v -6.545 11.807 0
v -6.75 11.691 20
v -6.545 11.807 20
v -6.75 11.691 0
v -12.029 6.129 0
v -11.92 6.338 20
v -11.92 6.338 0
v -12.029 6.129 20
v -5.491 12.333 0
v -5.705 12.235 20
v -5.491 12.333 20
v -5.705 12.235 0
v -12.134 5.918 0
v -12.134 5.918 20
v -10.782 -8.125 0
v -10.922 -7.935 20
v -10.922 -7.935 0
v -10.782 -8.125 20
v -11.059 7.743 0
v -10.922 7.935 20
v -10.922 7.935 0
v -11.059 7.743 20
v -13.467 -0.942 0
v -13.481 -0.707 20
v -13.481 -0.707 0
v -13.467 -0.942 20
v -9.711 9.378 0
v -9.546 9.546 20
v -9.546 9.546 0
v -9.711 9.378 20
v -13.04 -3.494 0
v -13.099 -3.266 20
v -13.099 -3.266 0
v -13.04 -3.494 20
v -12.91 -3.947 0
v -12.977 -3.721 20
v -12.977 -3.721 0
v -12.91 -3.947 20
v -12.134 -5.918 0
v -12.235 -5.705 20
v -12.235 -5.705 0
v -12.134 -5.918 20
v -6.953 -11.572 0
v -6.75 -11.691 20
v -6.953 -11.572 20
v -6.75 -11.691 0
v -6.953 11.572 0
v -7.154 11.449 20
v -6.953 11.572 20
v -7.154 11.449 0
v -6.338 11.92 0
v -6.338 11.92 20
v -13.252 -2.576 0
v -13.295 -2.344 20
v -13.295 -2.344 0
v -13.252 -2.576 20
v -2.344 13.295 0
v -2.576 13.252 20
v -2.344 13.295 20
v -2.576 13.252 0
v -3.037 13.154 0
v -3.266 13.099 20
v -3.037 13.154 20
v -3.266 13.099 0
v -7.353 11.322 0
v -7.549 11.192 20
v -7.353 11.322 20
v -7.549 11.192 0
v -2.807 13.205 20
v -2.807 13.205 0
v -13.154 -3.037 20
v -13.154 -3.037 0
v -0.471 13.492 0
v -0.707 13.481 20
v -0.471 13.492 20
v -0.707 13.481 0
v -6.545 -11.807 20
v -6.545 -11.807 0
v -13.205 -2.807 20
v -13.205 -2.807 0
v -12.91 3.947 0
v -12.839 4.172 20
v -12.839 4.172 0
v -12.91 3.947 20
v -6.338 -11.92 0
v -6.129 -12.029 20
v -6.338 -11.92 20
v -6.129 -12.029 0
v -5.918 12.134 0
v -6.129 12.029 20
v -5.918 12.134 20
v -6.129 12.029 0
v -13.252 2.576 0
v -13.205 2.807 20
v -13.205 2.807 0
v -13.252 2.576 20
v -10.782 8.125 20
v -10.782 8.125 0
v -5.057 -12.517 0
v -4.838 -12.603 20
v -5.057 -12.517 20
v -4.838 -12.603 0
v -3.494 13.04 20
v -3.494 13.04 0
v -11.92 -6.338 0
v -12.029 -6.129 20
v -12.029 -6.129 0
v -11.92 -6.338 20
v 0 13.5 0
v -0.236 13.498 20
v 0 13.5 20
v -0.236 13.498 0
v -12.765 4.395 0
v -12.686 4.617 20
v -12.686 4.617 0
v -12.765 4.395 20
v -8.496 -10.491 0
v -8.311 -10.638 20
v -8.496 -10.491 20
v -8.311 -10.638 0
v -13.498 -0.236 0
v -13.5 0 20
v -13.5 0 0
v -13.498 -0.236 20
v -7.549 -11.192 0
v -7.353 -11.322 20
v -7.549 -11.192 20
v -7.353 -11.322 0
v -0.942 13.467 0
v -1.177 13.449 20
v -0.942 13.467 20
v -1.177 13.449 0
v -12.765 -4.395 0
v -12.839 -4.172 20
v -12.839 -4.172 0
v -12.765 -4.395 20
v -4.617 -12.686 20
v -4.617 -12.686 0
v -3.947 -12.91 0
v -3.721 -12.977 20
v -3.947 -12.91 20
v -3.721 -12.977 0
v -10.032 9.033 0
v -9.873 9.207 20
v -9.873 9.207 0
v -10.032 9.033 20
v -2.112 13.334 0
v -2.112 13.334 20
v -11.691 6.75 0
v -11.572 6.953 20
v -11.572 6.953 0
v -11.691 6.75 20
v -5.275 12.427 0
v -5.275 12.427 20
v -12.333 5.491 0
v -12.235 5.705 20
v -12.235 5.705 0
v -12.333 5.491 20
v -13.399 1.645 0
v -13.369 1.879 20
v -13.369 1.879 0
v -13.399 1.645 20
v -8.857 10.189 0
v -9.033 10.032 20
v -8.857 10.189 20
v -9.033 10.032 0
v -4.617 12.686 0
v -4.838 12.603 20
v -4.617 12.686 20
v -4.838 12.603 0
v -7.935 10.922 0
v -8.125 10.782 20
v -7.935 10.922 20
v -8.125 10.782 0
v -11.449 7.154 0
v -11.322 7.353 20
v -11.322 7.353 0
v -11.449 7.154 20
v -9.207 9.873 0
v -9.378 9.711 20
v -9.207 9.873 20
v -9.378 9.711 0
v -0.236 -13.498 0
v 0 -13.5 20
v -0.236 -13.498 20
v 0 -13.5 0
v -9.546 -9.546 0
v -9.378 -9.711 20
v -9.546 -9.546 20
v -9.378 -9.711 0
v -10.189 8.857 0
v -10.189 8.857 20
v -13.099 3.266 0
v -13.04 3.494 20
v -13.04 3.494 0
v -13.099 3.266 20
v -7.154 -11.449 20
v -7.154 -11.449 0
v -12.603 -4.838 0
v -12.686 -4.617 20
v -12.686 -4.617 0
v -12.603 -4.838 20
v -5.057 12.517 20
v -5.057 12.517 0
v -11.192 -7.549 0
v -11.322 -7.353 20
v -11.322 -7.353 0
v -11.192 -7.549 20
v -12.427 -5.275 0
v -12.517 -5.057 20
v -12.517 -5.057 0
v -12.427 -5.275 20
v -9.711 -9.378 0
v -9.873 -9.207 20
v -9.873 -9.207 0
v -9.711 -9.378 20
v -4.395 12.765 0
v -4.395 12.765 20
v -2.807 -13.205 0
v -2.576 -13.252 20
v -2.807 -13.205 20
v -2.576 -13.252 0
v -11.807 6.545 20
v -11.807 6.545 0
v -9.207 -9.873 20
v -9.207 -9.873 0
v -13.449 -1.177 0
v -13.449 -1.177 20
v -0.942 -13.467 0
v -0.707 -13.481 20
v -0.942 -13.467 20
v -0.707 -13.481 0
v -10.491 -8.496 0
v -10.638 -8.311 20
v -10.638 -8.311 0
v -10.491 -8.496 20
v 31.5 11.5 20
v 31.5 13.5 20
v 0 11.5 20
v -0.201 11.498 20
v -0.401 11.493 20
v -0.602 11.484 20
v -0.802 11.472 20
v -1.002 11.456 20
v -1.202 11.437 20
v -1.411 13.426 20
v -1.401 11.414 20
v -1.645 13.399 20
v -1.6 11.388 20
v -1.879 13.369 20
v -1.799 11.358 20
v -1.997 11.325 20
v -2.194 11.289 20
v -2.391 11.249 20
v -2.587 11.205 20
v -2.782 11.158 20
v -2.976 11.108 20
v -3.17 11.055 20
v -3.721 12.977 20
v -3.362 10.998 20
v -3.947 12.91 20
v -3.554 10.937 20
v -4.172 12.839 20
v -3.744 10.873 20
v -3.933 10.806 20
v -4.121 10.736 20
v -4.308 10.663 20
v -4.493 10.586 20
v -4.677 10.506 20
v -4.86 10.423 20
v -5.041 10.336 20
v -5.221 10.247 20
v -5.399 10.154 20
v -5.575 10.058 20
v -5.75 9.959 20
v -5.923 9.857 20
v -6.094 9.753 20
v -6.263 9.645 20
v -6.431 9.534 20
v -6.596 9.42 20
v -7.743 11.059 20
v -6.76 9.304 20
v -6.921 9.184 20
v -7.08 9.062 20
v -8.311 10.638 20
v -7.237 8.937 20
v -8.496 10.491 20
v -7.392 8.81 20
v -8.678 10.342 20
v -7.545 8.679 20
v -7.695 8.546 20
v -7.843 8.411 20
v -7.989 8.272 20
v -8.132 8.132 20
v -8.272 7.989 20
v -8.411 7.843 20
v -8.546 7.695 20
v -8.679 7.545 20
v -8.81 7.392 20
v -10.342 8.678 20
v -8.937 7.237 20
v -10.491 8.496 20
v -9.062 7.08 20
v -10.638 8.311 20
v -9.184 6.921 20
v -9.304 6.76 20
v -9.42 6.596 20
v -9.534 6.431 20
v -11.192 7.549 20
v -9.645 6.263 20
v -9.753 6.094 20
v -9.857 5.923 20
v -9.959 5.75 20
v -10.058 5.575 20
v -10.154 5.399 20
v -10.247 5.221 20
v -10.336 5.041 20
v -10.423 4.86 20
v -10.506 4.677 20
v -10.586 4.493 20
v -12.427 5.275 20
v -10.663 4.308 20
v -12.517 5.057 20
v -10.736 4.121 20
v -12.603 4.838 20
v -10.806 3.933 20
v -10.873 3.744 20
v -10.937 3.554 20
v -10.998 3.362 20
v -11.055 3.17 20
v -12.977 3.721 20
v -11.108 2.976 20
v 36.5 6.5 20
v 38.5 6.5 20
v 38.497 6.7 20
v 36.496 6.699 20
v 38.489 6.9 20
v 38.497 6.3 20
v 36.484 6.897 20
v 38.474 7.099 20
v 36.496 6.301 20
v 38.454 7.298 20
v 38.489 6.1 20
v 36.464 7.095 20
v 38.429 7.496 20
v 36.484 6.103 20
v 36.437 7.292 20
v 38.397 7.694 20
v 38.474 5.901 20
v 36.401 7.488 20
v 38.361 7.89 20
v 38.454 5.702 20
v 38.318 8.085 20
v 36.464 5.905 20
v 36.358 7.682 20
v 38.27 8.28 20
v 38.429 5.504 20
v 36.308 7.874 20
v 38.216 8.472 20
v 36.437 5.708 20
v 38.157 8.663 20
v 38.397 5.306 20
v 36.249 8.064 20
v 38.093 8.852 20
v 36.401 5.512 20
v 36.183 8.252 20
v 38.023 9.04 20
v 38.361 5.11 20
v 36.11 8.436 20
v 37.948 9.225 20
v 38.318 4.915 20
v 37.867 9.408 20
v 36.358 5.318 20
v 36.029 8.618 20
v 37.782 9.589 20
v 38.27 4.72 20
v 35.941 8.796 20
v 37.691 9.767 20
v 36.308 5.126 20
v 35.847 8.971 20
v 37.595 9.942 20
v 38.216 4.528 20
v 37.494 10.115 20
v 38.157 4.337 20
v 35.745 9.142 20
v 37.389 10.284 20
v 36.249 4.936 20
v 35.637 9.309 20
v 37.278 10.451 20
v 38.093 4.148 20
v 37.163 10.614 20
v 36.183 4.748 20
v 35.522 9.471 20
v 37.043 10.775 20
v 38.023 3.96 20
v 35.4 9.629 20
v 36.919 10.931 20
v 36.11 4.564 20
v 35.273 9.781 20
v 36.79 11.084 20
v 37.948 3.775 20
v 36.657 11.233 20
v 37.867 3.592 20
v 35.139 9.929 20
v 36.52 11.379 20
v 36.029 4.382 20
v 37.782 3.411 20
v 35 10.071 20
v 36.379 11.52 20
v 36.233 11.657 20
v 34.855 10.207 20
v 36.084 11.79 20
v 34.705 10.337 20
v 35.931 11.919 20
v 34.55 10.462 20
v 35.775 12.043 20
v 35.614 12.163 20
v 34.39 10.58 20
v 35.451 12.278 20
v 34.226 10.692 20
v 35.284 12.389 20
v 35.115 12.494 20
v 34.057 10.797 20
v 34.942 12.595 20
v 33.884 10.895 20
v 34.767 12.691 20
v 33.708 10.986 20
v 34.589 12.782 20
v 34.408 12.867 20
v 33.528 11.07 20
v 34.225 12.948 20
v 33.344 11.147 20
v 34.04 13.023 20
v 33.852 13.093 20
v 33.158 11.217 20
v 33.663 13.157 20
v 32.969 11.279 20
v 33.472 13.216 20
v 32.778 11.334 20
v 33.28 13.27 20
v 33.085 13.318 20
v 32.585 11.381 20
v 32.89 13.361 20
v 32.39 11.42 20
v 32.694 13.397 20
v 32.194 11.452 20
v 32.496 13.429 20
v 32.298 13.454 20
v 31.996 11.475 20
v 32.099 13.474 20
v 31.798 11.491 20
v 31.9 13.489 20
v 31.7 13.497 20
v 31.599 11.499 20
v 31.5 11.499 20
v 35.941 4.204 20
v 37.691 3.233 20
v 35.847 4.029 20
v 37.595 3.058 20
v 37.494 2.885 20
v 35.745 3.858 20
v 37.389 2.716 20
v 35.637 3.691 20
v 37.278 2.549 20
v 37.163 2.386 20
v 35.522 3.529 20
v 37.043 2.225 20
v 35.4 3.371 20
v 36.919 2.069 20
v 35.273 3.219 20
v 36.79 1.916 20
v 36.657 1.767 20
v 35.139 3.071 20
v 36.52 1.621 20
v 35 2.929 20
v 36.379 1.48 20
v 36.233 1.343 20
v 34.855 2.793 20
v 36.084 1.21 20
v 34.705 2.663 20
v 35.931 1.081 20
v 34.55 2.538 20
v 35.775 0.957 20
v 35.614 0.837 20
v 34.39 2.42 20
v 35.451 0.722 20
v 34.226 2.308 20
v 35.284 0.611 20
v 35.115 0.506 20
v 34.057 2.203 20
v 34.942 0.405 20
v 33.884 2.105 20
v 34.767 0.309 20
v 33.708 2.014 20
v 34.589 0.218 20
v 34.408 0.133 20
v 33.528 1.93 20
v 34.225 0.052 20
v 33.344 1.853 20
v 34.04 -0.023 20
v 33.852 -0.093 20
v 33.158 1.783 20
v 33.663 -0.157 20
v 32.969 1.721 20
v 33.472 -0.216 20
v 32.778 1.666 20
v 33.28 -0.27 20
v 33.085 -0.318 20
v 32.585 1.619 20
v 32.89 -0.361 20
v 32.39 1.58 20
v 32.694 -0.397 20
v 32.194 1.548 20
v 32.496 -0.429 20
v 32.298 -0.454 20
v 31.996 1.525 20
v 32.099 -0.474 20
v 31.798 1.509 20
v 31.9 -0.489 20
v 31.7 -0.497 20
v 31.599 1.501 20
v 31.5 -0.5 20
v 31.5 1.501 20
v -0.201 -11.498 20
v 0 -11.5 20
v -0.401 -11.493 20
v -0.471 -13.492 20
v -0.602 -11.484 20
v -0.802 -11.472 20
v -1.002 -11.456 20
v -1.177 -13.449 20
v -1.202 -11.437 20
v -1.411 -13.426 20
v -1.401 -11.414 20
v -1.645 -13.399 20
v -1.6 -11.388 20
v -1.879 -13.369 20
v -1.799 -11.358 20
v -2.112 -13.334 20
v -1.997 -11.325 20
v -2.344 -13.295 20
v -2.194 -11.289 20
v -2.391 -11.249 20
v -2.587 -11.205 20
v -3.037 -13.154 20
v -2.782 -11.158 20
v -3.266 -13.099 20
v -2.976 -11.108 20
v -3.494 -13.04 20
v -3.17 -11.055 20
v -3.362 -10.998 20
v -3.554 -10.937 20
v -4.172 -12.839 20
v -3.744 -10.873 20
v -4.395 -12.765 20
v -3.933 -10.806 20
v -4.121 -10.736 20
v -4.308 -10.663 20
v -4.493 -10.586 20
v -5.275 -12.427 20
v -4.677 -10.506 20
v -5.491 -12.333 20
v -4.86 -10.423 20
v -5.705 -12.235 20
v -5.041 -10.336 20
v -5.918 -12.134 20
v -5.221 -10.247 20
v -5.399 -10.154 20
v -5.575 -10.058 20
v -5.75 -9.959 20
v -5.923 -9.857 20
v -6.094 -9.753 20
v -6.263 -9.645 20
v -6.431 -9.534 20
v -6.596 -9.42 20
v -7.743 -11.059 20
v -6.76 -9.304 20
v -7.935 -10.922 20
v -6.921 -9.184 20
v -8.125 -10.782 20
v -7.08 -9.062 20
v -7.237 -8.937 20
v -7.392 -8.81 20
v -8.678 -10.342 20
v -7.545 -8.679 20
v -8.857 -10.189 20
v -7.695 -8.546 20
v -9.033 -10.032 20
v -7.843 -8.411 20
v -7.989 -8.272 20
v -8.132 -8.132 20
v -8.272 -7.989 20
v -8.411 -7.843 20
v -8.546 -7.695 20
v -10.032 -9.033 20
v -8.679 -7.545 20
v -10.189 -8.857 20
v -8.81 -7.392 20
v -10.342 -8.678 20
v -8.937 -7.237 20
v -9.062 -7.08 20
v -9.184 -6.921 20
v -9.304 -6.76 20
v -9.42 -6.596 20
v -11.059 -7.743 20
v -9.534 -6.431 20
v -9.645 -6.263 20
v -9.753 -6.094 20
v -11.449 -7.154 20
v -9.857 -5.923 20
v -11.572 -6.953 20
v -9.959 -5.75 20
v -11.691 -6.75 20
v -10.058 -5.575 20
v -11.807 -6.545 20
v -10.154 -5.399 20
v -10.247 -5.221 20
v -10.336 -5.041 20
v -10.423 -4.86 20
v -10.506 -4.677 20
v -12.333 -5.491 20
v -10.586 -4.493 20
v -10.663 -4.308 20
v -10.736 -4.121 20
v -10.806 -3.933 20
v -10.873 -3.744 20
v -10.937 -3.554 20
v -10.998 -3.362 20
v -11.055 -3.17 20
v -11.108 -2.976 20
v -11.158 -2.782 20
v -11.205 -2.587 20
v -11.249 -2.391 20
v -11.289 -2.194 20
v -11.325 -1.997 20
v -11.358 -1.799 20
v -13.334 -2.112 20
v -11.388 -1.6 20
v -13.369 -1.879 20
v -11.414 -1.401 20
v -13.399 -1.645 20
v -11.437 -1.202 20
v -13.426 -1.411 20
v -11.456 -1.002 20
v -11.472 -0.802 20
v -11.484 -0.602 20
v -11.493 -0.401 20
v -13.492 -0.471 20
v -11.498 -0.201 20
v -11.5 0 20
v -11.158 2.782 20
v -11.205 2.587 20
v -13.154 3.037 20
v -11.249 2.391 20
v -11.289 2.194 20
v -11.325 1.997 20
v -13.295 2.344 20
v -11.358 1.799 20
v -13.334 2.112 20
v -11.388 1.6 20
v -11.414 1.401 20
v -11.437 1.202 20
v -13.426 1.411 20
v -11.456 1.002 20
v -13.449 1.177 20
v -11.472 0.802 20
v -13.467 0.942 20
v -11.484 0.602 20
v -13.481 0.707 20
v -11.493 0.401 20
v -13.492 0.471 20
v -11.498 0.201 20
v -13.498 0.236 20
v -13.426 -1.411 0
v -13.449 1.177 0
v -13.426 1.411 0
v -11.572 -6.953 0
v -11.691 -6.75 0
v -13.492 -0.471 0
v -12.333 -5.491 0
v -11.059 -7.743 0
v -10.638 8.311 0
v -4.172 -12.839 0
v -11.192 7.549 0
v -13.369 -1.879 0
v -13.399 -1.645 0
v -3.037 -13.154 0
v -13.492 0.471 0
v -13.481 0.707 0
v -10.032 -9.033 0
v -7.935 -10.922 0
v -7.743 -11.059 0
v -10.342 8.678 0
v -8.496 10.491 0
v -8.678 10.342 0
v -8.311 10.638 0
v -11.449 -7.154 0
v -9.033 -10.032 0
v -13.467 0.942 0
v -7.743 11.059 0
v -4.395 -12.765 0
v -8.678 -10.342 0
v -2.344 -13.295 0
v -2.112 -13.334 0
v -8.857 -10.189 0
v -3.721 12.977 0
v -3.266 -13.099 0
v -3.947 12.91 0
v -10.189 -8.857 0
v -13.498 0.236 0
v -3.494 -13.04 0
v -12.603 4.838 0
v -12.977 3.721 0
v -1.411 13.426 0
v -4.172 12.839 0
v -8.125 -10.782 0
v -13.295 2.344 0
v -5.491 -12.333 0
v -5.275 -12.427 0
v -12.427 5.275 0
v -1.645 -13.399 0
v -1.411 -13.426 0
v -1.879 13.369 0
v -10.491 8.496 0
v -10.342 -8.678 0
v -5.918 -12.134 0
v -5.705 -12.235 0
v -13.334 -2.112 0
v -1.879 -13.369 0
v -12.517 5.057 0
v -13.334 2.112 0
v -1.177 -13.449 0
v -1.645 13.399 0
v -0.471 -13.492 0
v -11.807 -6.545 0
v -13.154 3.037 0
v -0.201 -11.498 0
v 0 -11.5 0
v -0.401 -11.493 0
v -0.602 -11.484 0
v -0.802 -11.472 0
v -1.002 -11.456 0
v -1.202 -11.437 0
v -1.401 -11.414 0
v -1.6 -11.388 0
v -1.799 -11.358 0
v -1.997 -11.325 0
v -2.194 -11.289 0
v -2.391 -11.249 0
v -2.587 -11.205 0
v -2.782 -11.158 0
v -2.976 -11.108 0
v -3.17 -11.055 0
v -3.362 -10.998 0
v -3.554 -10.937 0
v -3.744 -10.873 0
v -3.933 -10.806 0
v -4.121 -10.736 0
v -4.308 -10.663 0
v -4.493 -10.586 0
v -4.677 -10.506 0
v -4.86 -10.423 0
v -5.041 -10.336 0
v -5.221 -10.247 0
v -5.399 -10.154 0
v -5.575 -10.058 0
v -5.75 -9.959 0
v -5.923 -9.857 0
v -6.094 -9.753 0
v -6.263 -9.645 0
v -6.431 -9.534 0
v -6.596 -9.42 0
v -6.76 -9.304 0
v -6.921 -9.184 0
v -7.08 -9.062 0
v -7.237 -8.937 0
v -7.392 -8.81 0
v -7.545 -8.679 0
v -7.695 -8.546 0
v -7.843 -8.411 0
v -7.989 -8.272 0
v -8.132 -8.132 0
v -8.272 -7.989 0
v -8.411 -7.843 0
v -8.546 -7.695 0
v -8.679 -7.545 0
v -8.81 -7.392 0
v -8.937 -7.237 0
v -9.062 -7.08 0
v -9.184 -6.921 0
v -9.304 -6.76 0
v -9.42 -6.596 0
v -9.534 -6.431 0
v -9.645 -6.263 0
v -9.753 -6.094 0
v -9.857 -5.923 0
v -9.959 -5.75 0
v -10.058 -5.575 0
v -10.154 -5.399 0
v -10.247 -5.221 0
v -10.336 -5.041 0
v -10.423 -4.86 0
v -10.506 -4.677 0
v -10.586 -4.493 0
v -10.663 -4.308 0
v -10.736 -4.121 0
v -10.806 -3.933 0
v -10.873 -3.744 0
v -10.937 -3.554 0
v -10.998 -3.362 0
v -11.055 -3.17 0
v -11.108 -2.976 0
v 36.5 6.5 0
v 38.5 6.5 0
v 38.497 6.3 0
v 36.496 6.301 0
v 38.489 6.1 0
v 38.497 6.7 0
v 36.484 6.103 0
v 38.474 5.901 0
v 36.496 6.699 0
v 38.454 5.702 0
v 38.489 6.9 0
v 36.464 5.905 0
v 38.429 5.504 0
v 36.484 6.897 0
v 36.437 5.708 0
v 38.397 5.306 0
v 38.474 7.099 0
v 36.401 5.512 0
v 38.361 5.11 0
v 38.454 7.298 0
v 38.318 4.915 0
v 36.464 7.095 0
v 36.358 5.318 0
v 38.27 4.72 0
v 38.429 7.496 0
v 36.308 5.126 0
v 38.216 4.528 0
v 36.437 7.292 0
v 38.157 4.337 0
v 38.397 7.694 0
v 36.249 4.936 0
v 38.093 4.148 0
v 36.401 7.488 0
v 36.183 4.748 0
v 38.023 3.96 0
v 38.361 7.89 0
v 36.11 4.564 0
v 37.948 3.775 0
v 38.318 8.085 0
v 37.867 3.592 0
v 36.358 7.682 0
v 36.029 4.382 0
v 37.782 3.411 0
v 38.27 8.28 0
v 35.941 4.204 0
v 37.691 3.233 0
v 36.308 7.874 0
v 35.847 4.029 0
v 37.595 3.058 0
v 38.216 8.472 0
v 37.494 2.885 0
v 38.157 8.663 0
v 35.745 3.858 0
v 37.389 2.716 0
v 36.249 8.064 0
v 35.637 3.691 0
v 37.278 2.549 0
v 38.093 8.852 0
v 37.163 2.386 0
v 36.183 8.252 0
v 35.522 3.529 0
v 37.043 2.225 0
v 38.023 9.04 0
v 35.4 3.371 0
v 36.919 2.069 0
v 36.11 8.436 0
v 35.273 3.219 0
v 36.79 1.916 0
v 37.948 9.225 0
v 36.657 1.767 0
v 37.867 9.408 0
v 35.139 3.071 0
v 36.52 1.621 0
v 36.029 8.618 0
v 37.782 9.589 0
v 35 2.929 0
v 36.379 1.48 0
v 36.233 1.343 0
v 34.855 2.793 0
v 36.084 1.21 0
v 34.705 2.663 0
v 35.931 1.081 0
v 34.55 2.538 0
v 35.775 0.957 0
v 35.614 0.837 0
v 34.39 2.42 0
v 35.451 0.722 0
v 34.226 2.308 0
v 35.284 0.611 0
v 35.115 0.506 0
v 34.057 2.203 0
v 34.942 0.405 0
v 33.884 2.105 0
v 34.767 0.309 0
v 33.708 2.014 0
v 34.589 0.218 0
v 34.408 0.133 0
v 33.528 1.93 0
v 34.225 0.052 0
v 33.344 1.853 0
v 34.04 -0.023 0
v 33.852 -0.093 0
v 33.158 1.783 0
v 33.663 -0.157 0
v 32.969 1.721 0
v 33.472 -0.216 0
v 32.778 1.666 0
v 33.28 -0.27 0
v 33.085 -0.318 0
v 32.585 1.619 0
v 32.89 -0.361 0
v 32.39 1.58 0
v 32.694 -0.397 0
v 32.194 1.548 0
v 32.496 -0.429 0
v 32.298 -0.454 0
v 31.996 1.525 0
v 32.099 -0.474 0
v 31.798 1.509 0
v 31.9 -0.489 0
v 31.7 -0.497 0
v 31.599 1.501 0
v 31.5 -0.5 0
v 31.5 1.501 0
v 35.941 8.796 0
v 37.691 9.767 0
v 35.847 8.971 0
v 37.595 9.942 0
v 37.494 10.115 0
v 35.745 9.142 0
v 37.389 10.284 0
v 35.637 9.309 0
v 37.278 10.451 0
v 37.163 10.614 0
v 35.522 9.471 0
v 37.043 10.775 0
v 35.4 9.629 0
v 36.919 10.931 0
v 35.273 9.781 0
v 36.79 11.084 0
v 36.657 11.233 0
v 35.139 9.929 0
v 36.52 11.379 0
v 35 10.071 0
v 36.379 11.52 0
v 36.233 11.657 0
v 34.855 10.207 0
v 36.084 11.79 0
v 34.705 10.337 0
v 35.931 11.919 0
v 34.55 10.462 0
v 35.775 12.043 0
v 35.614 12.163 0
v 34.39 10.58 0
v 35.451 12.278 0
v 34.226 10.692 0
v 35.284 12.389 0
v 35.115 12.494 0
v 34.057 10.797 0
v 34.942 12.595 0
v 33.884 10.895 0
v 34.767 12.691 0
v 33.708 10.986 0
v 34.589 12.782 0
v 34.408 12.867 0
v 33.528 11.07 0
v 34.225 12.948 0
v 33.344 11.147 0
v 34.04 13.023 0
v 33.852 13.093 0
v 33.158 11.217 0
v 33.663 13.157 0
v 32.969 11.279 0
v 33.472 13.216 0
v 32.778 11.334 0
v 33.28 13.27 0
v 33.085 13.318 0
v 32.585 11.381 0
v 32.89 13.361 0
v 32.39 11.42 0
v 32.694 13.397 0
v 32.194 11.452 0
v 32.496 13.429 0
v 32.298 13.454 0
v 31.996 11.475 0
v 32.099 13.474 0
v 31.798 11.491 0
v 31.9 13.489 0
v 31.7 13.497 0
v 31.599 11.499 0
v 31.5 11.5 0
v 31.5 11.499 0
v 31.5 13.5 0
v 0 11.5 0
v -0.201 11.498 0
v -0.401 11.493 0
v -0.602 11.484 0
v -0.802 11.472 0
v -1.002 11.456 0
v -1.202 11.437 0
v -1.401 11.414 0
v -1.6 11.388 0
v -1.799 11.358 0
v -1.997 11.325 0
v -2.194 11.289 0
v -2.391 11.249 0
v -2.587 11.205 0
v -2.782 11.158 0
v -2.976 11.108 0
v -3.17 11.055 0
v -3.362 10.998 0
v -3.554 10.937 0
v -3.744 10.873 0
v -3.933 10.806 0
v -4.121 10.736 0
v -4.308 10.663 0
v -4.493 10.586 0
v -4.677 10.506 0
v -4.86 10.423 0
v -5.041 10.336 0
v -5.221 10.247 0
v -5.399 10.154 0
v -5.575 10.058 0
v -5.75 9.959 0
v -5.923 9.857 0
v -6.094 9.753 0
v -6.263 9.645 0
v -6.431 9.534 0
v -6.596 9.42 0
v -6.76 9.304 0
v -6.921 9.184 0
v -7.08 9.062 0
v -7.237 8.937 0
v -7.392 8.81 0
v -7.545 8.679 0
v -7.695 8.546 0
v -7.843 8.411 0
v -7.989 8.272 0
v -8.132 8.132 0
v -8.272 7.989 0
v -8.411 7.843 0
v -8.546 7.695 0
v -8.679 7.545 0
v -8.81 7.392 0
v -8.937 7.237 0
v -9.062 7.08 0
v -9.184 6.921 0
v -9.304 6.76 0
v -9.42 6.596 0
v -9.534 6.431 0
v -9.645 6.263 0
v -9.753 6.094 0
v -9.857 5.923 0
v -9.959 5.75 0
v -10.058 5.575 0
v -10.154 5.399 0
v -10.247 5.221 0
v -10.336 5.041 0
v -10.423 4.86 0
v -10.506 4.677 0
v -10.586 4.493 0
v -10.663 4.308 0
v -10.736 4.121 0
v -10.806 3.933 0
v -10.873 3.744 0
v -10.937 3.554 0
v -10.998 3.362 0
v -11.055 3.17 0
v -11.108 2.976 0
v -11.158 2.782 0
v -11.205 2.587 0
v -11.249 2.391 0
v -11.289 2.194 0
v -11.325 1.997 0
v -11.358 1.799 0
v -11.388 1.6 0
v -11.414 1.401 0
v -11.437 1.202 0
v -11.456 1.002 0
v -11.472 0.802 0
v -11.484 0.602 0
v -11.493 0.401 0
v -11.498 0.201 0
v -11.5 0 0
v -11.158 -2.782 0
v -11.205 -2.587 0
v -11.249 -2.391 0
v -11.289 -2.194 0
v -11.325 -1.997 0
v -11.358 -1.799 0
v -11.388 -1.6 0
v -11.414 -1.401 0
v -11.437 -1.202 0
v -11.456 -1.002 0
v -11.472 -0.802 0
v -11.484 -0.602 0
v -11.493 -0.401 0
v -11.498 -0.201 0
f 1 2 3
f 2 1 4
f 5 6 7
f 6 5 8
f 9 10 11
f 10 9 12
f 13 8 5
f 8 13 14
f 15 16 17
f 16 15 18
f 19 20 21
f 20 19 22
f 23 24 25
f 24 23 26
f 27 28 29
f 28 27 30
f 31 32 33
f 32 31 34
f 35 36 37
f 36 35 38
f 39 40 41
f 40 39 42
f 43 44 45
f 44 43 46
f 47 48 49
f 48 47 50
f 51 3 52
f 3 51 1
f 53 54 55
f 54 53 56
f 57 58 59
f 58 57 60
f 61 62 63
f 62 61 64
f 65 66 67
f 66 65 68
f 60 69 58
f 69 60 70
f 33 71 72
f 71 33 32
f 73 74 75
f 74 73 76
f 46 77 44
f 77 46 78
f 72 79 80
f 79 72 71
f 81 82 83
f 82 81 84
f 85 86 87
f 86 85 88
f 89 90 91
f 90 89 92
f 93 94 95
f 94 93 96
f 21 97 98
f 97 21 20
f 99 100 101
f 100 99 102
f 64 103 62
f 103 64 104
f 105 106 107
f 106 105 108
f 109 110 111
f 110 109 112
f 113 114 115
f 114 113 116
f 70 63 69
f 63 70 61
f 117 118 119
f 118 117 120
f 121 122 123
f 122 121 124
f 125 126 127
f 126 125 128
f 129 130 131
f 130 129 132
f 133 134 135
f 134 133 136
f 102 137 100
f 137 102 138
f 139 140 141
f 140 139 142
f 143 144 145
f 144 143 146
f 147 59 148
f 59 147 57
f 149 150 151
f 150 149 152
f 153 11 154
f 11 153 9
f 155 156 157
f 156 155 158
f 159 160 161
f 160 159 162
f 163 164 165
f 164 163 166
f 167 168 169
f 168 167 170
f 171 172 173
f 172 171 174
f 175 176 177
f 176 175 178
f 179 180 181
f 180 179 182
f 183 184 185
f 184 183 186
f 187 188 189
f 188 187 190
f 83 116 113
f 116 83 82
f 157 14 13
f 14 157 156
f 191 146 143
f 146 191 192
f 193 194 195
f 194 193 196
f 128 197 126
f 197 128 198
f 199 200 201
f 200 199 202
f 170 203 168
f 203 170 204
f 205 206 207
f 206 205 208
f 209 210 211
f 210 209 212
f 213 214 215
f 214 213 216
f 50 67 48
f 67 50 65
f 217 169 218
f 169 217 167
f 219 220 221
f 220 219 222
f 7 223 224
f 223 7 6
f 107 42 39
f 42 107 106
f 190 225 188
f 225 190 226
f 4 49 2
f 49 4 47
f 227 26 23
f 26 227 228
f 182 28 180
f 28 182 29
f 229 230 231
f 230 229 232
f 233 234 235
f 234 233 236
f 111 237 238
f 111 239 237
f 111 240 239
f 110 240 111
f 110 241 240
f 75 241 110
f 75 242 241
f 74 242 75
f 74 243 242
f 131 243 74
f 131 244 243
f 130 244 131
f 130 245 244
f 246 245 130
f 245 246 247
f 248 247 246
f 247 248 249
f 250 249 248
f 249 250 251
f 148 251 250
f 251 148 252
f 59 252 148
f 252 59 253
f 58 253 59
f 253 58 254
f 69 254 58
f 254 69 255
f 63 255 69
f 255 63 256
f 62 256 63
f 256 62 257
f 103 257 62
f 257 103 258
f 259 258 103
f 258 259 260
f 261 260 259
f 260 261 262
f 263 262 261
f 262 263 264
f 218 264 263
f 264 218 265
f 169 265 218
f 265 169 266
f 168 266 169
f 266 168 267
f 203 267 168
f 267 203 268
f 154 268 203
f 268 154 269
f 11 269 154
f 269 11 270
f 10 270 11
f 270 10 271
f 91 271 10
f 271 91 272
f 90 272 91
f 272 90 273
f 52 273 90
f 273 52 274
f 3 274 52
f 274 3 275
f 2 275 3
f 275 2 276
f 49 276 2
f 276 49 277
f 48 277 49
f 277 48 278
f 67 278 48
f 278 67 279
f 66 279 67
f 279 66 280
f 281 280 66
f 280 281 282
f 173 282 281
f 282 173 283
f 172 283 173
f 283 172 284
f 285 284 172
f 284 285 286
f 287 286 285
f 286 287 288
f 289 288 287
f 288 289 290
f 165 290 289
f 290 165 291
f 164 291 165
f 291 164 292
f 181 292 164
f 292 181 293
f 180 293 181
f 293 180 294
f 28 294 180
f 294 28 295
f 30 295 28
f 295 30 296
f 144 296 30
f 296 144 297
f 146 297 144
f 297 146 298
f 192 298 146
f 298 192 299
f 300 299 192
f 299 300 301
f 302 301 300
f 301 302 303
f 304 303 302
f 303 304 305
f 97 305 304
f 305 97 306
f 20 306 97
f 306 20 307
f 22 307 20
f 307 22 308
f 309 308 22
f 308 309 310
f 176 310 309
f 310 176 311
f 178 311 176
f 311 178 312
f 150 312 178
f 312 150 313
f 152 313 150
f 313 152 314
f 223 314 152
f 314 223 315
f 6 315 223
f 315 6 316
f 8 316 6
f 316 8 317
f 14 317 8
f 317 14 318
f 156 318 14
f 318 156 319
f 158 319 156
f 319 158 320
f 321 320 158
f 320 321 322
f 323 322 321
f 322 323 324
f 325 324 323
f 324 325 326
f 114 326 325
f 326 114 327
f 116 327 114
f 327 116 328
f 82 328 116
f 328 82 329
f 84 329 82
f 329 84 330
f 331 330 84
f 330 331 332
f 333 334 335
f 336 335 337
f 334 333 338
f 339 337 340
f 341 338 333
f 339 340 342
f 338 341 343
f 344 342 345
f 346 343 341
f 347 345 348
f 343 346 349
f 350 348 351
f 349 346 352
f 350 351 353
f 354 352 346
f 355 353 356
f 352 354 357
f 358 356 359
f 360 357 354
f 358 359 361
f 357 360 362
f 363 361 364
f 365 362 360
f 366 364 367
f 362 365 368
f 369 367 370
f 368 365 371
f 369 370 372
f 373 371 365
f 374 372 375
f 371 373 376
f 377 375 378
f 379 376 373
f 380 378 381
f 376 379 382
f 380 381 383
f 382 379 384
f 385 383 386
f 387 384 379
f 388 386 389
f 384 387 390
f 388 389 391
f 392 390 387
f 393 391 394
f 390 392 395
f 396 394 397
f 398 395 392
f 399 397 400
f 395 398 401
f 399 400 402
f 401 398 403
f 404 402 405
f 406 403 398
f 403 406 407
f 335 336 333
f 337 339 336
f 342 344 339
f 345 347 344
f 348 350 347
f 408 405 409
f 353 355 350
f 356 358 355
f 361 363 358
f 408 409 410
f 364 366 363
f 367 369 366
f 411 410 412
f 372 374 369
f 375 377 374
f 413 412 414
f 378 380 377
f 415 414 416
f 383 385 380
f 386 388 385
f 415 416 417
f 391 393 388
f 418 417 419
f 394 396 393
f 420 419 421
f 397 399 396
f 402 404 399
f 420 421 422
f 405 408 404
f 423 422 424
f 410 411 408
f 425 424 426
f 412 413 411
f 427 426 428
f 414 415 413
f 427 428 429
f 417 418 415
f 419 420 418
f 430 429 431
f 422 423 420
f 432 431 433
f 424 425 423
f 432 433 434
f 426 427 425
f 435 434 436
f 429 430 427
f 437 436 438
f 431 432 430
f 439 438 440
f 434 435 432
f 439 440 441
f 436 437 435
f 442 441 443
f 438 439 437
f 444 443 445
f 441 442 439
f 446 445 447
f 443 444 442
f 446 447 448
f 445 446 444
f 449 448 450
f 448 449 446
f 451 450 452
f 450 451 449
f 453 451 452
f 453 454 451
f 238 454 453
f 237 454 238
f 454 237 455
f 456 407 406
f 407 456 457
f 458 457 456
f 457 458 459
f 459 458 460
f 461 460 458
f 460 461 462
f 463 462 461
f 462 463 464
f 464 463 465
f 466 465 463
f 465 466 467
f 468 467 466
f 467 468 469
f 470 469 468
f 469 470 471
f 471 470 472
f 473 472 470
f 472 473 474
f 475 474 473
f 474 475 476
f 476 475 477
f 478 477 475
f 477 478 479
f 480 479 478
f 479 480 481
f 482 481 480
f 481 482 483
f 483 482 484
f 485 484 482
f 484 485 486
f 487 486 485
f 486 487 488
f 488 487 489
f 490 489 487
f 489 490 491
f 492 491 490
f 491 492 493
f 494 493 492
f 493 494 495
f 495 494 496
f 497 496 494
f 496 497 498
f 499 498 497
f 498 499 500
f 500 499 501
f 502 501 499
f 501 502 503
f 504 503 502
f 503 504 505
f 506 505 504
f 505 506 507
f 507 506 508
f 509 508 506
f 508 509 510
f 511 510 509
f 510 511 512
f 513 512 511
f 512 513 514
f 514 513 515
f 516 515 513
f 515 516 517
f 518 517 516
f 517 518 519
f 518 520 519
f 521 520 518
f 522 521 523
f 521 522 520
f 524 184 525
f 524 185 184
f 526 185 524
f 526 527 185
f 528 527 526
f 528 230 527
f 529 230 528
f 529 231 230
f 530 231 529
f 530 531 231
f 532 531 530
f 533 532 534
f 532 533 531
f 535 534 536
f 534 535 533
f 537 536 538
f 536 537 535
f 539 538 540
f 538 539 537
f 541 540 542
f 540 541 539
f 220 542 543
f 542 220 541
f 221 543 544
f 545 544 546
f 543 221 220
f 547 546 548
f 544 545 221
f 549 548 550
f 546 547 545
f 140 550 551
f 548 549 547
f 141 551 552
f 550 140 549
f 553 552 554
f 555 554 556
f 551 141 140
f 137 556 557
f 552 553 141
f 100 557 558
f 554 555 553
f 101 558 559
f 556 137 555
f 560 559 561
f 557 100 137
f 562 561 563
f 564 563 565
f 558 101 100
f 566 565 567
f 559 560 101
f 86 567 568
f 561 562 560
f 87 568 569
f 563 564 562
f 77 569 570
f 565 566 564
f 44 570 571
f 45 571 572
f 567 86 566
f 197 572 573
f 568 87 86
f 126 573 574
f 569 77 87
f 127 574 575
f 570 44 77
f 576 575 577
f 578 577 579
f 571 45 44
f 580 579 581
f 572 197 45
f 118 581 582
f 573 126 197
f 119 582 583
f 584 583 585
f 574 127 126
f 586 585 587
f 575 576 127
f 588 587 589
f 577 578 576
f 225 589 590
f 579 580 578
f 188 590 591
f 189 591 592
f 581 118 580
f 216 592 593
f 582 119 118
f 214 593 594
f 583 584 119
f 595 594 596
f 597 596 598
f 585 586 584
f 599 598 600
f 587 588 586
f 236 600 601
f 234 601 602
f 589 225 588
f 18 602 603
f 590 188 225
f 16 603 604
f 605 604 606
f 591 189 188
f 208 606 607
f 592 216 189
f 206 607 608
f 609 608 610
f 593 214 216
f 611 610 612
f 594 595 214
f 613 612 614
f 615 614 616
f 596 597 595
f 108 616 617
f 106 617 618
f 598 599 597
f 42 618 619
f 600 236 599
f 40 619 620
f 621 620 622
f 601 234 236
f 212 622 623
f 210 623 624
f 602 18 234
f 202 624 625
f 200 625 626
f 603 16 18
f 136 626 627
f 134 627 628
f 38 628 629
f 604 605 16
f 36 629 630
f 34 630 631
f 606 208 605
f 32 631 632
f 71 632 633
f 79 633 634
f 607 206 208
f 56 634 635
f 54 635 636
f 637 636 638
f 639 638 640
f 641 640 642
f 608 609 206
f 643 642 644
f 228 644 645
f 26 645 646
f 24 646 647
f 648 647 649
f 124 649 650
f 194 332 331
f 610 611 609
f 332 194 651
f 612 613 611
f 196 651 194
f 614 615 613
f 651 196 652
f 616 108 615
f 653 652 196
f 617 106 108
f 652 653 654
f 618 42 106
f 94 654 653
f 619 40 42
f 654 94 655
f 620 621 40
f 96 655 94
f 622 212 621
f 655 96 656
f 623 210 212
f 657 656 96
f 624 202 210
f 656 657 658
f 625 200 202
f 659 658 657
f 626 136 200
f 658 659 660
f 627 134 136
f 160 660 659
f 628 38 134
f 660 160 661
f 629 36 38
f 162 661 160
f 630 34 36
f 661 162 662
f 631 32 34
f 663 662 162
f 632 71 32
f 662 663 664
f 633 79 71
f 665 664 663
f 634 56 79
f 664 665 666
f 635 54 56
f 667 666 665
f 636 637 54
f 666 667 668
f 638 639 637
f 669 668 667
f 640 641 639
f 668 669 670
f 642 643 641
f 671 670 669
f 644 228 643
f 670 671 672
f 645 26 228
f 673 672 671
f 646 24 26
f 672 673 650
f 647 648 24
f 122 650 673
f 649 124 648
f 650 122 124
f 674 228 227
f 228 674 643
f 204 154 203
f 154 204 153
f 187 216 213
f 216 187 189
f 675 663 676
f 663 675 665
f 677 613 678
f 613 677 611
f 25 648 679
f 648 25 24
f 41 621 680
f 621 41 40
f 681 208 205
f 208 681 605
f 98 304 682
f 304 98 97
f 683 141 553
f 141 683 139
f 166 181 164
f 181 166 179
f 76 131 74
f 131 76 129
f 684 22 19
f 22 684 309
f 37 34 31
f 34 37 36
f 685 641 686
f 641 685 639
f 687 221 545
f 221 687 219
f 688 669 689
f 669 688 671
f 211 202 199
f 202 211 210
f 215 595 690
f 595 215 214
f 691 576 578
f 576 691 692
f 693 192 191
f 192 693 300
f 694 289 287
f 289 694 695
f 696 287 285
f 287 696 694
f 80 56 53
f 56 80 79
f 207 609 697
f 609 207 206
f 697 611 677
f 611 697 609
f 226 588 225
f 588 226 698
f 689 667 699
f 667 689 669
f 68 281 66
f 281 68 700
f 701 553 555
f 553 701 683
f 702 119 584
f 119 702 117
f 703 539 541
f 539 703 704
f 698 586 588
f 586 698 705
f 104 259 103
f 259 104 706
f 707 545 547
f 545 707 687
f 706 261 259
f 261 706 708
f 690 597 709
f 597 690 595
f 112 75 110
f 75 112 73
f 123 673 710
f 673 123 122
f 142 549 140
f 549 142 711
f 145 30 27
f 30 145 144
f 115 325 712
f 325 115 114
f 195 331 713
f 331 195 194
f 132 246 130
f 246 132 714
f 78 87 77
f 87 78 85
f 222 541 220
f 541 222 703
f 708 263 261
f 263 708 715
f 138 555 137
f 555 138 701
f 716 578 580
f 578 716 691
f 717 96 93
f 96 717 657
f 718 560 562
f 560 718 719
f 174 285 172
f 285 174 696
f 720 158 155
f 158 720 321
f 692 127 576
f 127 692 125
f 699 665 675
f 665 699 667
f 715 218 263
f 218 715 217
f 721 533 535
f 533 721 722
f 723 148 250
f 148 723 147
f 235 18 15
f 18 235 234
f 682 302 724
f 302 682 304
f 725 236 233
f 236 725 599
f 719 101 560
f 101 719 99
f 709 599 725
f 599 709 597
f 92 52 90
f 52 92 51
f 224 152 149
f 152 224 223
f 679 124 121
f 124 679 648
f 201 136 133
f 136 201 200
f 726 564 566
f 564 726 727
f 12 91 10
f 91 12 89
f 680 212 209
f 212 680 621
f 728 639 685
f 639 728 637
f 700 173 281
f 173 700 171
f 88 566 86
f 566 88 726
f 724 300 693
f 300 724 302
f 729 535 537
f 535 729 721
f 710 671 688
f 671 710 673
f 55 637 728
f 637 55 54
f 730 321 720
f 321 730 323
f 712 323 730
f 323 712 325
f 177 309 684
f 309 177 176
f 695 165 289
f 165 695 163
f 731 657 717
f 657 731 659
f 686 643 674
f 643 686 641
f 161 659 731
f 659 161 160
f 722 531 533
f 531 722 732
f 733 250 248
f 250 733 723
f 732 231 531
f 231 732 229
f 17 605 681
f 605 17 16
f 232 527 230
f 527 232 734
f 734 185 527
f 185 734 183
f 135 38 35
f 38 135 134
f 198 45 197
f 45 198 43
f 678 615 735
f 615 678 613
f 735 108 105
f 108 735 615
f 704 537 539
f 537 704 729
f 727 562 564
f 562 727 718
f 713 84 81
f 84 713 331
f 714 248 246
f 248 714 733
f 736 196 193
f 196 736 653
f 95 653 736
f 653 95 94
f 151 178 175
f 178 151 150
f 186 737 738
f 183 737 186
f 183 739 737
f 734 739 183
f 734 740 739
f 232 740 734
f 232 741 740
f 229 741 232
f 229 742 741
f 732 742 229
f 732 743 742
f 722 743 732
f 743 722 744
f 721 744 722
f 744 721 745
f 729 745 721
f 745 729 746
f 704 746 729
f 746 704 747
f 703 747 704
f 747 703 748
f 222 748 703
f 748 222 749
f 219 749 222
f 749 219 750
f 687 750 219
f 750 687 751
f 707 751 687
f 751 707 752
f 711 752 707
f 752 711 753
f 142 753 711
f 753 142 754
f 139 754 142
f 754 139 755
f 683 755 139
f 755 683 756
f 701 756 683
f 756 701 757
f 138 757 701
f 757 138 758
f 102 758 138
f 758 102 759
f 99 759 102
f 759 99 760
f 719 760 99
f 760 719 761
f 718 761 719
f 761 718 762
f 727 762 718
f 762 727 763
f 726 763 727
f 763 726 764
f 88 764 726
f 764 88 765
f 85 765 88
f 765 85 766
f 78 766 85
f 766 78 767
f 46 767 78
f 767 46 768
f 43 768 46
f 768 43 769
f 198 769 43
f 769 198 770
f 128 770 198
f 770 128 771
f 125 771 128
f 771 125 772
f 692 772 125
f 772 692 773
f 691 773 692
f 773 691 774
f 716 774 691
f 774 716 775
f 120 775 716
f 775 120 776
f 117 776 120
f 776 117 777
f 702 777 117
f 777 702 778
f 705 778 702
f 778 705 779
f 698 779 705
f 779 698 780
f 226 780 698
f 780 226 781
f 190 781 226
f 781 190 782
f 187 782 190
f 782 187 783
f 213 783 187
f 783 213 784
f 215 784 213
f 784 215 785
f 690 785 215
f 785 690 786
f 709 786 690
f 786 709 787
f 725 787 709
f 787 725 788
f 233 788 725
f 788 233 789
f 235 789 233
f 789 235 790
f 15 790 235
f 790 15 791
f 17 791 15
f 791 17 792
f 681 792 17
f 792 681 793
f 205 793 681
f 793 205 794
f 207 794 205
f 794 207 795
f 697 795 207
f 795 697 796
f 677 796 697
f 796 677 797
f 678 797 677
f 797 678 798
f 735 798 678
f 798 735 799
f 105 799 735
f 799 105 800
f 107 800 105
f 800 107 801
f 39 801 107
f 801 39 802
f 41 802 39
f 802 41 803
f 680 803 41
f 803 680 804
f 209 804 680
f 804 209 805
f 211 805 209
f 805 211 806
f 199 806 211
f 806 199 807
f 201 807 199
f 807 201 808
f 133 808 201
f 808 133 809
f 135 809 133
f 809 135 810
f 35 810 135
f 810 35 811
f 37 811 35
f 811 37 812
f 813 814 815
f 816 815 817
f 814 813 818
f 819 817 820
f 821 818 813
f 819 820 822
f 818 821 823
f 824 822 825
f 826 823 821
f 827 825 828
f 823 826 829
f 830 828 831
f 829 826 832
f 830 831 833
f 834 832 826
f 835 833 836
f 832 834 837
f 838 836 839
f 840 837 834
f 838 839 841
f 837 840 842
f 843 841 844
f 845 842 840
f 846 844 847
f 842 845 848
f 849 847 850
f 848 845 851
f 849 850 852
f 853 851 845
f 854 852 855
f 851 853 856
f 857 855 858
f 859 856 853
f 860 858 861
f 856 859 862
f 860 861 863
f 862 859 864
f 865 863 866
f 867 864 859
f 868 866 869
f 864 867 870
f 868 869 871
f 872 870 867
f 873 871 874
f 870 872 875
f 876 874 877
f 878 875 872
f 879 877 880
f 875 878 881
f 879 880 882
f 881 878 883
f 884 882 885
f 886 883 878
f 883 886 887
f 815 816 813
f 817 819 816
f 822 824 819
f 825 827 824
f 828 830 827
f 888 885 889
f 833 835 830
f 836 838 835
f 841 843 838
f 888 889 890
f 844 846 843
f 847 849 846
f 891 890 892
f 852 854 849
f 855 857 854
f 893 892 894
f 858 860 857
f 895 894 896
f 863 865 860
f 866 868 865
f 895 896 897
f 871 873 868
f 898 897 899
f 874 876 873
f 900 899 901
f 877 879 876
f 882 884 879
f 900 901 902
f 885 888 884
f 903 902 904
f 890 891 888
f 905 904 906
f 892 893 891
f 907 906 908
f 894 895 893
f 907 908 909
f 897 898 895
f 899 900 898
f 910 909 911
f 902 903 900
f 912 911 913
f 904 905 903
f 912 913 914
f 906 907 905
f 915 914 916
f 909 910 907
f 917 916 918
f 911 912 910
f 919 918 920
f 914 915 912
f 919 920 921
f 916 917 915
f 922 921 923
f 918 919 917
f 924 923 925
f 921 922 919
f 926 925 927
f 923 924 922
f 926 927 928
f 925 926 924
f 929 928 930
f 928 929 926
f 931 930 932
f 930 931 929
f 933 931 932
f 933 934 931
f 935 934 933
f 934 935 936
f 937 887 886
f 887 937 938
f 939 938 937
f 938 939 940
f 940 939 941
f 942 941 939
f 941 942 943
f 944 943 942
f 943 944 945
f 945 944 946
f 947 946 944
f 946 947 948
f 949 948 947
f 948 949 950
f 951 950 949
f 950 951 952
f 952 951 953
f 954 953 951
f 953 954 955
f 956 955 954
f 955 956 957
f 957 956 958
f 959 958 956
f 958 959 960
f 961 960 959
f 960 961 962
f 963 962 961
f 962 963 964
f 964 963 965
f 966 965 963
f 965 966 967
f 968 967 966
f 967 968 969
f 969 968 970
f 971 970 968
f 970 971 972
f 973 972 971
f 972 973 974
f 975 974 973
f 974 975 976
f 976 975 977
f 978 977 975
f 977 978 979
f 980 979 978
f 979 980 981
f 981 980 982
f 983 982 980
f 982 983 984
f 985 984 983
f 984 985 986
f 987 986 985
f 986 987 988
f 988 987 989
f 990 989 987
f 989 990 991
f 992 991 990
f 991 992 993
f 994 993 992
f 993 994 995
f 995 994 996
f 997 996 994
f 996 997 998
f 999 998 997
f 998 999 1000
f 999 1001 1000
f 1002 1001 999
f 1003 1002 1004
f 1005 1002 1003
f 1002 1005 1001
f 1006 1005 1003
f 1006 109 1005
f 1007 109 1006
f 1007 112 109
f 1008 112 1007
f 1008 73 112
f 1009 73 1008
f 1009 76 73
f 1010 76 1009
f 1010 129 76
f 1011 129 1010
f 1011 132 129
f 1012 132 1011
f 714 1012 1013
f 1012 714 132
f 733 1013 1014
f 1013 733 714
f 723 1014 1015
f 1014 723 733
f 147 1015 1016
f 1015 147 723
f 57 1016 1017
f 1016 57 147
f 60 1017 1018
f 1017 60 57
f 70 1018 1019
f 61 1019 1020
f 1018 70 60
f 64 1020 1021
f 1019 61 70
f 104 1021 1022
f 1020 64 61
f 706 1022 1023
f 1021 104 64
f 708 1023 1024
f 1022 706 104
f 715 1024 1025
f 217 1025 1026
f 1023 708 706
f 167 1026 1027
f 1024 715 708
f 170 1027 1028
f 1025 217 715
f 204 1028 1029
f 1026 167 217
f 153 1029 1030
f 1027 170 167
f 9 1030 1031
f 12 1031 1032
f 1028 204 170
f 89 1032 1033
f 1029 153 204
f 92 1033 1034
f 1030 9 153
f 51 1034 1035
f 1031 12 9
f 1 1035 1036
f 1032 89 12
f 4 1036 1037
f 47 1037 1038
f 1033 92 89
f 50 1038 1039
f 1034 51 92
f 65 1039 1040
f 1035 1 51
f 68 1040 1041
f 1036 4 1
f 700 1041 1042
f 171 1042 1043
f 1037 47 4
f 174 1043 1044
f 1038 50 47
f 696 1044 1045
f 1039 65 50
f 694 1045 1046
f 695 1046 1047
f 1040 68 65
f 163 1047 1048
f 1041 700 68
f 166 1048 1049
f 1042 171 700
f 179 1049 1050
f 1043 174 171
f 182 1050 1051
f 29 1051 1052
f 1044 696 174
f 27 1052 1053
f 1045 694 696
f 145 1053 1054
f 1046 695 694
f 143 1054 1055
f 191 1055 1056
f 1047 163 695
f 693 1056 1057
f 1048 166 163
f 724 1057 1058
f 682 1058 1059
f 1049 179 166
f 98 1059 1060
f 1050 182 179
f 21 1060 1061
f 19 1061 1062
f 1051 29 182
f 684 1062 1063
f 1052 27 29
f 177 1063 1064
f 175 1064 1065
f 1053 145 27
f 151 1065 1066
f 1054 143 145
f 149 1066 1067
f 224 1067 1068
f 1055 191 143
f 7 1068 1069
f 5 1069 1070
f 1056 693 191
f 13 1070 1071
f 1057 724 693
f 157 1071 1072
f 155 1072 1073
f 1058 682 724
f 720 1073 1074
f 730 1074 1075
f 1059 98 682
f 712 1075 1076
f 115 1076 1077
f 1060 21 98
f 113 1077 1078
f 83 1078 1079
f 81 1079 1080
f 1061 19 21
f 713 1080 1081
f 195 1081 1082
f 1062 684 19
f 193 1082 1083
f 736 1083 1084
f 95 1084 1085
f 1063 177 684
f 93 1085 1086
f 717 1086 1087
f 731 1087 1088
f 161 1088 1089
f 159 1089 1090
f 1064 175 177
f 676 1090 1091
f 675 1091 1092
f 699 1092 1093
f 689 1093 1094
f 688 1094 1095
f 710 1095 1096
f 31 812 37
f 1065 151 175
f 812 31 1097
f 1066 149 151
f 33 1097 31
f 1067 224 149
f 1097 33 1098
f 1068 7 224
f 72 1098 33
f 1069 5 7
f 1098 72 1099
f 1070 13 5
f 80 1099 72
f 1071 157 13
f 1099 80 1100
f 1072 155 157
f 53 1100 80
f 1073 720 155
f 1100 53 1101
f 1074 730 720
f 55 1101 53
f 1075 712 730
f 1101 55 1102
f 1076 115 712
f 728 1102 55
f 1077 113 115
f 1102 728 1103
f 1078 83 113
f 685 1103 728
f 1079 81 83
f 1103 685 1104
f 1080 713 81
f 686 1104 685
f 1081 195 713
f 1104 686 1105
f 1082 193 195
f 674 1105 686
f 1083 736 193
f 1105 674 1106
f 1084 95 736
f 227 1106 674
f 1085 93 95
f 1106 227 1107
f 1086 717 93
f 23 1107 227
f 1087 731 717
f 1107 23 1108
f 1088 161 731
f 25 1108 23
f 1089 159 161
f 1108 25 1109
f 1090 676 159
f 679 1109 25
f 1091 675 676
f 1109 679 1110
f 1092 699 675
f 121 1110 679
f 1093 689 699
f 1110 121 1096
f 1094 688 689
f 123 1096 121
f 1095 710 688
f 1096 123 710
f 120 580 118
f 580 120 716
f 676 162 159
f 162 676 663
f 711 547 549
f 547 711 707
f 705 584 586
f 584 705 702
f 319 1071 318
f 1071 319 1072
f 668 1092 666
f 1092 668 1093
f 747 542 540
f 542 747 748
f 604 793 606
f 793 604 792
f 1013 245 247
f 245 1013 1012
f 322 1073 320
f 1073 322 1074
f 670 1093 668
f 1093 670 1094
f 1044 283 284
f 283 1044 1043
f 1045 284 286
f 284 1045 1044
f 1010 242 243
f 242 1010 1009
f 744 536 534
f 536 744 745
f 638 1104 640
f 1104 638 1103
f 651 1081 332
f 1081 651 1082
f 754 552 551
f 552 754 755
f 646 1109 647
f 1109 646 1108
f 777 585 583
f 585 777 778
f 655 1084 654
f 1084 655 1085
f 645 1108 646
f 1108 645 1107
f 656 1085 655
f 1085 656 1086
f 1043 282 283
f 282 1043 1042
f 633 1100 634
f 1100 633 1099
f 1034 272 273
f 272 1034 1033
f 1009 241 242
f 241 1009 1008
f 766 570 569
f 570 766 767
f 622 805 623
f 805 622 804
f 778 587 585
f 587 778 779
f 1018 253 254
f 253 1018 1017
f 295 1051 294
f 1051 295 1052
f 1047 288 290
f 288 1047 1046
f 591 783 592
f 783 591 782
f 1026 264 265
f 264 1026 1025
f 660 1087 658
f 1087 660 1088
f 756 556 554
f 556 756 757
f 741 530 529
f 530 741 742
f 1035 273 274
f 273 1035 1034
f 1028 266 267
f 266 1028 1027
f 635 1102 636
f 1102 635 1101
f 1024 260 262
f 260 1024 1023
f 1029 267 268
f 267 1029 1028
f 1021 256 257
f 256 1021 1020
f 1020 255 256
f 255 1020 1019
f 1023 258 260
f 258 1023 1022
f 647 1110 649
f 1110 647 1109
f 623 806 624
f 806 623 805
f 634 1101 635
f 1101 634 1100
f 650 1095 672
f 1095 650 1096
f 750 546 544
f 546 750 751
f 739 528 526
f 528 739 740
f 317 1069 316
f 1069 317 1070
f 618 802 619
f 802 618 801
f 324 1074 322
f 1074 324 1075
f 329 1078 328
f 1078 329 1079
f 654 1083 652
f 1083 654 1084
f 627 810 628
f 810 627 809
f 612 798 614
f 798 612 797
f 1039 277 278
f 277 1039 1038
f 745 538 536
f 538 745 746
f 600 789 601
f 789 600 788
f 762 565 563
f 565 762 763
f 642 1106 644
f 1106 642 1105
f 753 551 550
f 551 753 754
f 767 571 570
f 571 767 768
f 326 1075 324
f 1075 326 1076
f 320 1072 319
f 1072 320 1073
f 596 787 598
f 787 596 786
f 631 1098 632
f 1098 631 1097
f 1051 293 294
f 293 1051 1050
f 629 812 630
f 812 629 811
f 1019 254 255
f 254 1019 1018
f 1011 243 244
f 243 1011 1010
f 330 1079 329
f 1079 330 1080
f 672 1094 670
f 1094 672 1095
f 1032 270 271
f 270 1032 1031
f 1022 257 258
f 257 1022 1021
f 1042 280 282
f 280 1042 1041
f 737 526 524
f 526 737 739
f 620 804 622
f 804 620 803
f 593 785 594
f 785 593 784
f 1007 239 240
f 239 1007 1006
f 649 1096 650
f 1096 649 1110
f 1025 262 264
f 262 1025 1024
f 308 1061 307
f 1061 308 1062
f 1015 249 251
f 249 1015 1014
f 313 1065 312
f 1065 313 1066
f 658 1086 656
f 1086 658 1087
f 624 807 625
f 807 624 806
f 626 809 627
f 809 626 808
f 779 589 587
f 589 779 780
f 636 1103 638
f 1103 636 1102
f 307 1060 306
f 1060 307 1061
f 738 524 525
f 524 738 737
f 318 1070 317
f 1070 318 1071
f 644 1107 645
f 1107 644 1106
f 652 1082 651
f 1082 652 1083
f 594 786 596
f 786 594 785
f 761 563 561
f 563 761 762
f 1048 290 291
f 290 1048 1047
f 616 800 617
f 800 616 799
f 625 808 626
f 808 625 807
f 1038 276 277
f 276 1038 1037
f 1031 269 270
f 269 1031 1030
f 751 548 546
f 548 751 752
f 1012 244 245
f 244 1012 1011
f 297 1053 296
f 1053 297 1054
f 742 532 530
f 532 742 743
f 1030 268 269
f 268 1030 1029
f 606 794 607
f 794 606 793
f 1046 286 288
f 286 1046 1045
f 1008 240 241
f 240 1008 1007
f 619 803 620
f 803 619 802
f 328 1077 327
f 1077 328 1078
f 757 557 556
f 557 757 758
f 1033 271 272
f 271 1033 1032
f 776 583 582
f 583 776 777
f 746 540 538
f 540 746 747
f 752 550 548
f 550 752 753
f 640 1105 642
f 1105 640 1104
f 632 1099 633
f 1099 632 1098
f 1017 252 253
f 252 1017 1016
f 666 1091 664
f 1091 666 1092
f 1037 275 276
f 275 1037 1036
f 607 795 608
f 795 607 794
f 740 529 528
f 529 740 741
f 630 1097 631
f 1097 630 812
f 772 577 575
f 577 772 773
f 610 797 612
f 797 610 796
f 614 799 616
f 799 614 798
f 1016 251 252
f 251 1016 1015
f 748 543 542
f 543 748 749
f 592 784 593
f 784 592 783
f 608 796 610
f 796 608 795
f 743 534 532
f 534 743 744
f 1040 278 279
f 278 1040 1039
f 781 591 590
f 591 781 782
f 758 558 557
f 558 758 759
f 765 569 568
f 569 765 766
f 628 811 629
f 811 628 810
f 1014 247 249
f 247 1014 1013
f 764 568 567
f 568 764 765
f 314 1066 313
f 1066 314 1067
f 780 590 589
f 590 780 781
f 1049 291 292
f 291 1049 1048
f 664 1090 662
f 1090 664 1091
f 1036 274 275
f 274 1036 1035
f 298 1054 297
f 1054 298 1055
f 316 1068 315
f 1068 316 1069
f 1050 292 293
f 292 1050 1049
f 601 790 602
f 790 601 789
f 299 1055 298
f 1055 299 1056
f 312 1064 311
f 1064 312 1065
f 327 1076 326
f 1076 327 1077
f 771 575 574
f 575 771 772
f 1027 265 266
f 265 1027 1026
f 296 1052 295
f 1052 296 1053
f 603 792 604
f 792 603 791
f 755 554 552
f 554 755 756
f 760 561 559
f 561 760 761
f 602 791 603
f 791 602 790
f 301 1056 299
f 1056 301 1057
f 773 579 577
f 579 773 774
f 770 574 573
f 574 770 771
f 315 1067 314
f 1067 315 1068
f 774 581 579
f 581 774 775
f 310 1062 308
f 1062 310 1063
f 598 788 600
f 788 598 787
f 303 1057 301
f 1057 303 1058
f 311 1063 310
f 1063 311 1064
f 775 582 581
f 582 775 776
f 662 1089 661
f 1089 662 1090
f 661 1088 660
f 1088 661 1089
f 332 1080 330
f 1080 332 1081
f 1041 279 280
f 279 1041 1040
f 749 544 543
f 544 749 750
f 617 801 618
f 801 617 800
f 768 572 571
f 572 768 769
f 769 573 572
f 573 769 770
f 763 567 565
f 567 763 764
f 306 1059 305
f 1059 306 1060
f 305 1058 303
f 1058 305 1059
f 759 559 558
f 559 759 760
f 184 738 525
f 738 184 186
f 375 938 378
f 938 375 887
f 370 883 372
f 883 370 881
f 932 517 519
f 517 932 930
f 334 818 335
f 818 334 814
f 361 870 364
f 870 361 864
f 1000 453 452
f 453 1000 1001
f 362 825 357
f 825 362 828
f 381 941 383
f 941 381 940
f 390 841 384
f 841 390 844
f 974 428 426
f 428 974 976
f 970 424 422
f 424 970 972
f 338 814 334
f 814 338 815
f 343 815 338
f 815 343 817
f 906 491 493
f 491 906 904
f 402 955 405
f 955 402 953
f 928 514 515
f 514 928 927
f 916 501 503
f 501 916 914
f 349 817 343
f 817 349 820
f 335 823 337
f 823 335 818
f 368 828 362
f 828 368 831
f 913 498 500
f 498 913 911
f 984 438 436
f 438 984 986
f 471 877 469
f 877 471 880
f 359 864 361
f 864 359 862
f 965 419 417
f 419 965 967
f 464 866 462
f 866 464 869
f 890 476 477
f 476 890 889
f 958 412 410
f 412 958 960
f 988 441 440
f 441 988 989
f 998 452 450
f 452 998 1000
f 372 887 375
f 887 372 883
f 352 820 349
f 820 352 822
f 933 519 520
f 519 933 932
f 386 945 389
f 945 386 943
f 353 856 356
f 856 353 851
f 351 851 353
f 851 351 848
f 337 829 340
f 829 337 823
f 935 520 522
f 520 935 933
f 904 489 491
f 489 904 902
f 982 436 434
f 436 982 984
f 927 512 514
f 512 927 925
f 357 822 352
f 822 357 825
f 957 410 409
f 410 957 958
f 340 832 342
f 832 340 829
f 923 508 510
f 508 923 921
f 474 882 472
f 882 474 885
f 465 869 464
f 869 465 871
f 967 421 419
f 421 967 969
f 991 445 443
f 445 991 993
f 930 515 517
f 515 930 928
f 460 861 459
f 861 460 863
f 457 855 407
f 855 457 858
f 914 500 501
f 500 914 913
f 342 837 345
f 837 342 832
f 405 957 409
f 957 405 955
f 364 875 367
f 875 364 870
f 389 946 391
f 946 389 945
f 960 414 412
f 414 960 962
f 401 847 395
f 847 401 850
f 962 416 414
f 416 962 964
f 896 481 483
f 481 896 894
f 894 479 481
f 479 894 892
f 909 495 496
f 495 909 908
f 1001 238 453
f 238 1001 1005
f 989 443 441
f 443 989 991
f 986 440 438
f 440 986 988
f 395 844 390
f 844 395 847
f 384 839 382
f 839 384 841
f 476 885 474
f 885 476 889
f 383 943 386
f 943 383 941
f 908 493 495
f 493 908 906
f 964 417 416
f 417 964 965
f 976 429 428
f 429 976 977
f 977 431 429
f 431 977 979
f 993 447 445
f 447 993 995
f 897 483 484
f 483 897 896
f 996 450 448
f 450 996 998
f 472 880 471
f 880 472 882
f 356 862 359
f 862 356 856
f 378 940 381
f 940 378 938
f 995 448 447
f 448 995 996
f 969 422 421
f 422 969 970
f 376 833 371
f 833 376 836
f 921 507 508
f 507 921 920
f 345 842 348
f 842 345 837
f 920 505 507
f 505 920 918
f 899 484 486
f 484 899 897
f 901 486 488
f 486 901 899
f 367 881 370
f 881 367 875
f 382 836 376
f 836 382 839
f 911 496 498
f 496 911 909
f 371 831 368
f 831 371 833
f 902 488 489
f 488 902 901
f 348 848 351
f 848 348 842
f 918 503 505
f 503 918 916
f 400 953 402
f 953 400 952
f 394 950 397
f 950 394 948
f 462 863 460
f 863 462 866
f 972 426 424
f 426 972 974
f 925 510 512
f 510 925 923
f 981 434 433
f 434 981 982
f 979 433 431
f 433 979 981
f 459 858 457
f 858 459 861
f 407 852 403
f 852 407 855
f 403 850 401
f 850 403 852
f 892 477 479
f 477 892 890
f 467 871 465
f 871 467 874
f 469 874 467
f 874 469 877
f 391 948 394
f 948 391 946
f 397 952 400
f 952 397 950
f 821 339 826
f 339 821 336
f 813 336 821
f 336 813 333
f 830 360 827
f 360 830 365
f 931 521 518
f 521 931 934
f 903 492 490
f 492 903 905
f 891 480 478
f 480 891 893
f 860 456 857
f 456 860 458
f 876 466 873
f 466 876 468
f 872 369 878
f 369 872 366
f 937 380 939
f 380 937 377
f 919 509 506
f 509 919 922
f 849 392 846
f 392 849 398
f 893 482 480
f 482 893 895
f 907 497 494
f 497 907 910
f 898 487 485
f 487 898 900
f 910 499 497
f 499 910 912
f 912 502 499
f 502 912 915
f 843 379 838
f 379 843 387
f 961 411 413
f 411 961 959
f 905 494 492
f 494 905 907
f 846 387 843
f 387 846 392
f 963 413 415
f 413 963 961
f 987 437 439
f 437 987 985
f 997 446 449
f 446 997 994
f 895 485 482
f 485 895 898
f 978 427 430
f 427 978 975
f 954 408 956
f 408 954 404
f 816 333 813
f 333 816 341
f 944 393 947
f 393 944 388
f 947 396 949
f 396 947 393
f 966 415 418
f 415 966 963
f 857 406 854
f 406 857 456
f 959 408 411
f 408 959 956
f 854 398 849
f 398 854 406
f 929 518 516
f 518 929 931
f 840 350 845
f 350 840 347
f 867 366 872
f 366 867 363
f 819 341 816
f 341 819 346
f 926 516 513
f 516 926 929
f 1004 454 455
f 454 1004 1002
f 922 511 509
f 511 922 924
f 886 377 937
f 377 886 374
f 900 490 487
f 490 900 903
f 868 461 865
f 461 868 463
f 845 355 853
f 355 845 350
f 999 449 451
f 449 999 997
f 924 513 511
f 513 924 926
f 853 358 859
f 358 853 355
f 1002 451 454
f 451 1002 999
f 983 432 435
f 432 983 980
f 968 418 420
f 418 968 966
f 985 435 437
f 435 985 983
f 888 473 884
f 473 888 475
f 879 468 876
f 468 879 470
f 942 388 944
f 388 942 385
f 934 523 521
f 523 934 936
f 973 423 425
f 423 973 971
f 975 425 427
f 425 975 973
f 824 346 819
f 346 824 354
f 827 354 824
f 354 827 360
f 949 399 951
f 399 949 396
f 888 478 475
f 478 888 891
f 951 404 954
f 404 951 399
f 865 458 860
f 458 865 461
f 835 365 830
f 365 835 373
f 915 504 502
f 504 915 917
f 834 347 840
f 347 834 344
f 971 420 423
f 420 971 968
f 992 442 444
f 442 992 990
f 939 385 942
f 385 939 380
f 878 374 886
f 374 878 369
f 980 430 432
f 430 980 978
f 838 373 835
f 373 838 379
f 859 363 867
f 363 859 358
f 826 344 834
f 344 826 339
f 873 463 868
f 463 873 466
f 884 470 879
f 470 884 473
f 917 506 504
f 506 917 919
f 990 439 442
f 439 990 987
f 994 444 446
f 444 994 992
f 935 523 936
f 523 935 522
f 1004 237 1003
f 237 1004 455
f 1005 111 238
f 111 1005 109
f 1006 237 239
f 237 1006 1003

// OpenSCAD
diameter = 23;
thickness = 2;
width = 20;
length = 20;
hook_radius = 5;
$fs = 0.2;
$fa = 1;

radius = diameter / 2;

difference() {
	cylinder(h=width, r=radius + thickness);
	cylinder(h=width + 0.1, r=radius);
	translate([0, -thickness - radius - 0.1, -0.1]) {
		cube([radius + thickness + 0.1, diameter + thickness * 2 + 0.2, width + 0.2]);
	}
}
translate([0, radius, 0]) {
	cube([radius + length, thickness, width]);
}
translate([radius + length, radius - hook_radius, 0]) {
	difference() {
		cylinder(h=width, r=hook_radius + thickness);
		cylinder(h=width + 0.1, r=hook_radius);
		translate([-hook_radius - thickness - 0.1, -hook_radius - thickness - 0.1, -0.1]) {
			cube([hook_radius + thickness + 0.1, hook_radius * 2 + thickness * 2 + 0.2, width + 0.2]);
		}
	}
}
